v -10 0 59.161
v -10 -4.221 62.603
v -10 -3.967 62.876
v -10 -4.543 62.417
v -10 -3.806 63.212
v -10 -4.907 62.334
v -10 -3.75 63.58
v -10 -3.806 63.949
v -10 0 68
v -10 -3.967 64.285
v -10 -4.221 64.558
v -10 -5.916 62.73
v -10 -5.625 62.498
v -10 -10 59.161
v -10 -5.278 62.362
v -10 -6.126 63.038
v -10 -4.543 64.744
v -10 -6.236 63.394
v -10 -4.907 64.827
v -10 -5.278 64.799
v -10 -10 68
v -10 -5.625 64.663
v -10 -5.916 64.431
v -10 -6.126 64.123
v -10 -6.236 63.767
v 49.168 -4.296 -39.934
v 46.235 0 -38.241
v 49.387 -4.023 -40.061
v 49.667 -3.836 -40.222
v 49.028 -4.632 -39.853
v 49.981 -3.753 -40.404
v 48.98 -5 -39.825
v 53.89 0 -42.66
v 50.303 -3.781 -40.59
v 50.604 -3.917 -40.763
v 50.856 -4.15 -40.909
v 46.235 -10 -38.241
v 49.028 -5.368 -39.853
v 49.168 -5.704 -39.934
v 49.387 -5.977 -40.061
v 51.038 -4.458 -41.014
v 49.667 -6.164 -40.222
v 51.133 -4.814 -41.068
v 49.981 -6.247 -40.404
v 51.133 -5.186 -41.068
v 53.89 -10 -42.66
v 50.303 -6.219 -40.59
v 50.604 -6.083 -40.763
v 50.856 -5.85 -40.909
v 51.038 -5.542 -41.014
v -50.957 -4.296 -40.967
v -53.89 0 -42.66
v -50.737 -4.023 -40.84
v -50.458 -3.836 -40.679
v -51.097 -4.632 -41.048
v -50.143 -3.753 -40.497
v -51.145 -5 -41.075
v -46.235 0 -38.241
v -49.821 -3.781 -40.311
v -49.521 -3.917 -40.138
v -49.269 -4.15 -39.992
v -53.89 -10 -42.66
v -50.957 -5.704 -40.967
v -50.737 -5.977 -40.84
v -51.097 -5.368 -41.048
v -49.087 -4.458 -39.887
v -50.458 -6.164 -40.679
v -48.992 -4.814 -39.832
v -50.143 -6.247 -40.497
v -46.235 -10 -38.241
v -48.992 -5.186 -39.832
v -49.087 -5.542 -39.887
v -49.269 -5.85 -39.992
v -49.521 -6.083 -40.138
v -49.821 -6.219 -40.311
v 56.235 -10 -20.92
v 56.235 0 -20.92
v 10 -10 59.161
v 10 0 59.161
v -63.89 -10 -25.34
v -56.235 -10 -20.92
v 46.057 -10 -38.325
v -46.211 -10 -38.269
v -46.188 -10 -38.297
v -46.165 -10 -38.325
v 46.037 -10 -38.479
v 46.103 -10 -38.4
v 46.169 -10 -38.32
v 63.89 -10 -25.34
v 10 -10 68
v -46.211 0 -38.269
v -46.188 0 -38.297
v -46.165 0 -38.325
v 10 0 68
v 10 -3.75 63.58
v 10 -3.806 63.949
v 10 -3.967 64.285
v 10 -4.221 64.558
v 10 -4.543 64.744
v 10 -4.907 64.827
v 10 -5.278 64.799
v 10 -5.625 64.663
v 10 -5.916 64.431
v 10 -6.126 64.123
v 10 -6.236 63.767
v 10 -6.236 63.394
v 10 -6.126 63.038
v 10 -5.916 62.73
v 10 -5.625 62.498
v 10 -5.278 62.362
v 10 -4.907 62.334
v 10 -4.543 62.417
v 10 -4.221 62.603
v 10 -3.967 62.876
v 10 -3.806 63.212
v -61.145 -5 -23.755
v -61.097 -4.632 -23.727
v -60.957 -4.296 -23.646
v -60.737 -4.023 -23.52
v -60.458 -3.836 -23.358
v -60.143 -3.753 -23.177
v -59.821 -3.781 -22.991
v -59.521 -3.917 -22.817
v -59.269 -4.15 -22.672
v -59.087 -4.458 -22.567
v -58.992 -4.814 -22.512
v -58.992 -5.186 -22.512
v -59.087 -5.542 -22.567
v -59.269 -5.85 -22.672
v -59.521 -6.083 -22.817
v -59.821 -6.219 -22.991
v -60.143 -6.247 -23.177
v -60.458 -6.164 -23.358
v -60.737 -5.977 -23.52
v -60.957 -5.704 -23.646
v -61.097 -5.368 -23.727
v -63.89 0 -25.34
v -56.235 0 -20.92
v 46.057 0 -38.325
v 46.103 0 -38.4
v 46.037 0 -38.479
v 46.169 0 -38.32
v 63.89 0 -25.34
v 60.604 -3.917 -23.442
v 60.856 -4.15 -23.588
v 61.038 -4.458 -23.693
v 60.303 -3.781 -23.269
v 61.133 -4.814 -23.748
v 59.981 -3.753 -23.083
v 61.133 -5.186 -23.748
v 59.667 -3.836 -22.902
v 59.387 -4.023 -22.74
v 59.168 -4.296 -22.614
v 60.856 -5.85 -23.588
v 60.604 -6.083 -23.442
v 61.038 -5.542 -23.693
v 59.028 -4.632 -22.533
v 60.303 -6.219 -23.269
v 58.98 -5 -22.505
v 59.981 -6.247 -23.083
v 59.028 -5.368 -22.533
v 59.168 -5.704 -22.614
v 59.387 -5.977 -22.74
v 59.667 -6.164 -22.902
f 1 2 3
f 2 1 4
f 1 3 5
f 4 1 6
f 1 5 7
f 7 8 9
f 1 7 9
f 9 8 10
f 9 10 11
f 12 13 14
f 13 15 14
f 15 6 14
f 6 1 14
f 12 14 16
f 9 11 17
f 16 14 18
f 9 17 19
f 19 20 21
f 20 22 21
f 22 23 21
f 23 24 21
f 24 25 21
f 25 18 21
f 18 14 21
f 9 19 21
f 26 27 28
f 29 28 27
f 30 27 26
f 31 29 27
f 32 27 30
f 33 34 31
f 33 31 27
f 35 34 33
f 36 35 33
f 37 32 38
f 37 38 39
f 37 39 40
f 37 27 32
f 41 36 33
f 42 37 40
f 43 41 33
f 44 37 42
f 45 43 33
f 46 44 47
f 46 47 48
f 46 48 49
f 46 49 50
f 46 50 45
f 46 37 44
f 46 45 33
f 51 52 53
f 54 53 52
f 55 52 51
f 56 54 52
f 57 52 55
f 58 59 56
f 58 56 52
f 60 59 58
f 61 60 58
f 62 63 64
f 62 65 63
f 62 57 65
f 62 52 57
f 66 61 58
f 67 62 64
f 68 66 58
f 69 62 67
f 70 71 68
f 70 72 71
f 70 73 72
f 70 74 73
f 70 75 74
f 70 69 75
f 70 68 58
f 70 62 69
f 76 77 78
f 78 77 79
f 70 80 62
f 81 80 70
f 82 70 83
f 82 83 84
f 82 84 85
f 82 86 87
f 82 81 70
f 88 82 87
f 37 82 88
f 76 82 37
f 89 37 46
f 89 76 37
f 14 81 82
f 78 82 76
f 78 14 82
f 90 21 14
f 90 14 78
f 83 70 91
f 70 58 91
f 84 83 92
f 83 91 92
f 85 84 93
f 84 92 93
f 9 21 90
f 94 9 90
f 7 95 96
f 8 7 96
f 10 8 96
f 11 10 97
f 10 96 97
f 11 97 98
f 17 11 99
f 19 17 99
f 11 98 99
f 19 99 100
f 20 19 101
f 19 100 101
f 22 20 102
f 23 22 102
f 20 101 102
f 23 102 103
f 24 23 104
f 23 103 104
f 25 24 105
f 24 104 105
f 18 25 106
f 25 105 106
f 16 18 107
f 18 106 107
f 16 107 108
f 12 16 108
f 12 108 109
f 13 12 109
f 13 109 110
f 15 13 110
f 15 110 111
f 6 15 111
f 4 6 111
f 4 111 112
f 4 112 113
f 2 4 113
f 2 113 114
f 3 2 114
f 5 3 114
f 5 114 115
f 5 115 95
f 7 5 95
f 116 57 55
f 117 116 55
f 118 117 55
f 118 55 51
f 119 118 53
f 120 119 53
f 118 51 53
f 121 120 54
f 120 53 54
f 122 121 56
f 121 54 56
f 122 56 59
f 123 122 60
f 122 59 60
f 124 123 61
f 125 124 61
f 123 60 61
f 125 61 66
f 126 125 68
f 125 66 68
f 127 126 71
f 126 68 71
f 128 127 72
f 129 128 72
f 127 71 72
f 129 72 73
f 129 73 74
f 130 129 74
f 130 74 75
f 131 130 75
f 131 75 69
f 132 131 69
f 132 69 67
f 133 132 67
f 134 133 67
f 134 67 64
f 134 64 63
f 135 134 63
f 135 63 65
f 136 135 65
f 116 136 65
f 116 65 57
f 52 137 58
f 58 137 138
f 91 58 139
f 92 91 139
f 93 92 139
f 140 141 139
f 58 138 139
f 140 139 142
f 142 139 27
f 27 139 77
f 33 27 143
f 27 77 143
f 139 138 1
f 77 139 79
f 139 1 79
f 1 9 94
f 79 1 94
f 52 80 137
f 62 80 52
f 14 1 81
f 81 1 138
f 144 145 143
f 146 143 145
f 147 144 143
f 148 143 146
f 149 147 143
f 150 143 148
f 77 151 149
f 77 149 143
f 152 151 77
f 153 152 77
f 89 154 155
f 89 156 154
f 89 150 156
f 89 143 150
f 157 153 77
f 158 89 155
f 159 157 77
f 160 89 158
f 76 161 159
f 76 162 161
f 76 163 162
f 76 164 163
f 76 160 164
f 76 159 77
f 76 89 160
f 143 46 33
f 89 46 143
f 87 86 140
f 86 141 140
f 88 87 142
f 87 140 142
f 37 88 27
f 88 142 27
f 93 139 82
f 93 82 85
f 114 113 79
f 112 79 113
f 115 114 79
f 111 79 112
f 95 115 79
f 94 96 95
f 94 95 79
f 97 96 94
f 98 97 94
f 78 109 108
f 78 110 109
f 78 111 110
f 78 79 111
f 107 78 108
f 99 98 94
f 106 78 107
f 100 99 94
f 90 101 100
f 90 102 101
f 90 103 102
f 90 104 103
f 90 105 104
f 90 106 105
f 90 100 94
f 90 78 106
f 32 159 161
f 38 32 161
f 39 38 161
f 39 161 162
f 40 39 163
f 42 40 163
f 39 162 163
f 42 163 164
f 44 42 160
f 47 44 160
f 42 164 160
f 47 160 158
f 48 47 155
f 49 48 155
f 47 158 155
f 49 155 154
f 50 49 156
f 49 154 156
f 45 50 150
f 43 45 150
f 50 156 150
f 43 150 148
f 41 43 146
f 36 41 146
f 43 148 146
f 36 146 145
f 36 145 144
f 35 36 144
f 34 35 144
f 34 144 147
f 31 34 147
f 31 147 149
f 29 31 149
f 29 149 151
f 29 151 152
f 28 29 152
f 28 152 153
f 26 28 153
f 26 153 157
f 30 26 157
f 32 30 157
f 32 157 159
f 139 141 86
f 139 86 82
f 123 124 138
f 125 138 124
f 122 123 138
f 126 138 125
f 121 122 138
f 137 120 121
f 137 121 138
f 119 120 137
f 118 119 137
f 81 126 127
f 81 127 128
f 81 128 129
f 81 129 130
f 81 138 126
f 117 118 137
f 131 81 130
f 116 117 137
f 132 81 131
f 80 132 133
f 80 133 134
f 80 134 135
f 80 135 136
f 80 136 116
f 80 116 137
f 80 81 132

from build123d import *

# Parameters (mm, degrees)
F0_R      = 60
F1_DEPTH  = 10
F2_W      = 20
F2_H      = 10
F3_DEPTH  = 10
F5_D      = 2.5
F7_D      = 2.5
F9_D      = 2.5
F11_DEPTH = 10.001
F13_DEPTH = 25


with BuildPart() as f1:
    # F0 (on Front) → F1 (new body)
    with BuildSketch(Plane.XZ):
        Circle(F0_R)
    extrude(amount=F1_DEPTH)

    # F2 (on face) → F3 (join)
    with BuildSketch(Plane.XZ.offset(10)):
        with Locations((0, 63)):
            Rectangle(F2_W, F2_H)
        Polygon((-53.8897274573, -42.6602540378), (-45.2294734195, -37.6602540378), (-55.2294734195, -20.3397459622), (-63.8897274573, -25.3397459622), align=None)
        Polygon((63.8897274573, -25.3397459622), (55.2294734195, -20.3397459622), (45.2294734195, -37.6602540378), (53.8897274573, -42.6602540378), align=None)
    extrude(amount=-F3_DEPTH)

    # F5 (through all)
    with Locations(Plane(origin=(-10, 0, 0), x_dir=(0, -1, 0), z_dir=(-1, 0, 0))):
        with Locations((5, 63.5803989155)):
            Hole(F5_D / 2)

    # F7 (through all)
    with Locations(Plane(origin=(-5, 0, 8.6602540378), x_dir=(0.8660254038, 0, 0.5), z_dir=(-0.5, 0, 0.8660254038))):
        with Locations((-63.5803989155, -5)):
            Hole(F7_D / 2)

    # F9 (through all)
    with Locations(Plane(origin=(-5, 0, -8.6602540378), x_dir=(0.8660254038, 0, -0.5), z_dir=(-0.5, 0, -0.8660254038))):
        with Locations((63.5803989155, 5)):
            Hole(F9_D / 2)

    # F10 (on face) → F11 (cut, through all)
    with BuildSketch(Plane.XZ):
        Polygon((46.057395637, -38.3253619075), (-46.2041050196, -38.3253619075), (-47.8550866246, -60.4935437441), (42.8329333663, -62.1057748795), align=None)
    extrude(amount=F11_DEPTH, mode=Mode.SUBTRACT)

    # F12 (on face) → F13 (cut)
    with BuildSketch(Plane(origin=(0, 0, 0), x_dir=(-1, 0, 0), z_dir=(0, 1, 0))):
        Polygon((10, 59.160797831), (56.2347538298, -20.9201448777), (84.3601897359, -9.6184732392), (39.3041819334, 80.4935470223), align=None)
        Polygon((-56.2347538298, -20.9201448777), (-10, 59.160797831), (-43.3372279011, 71.7235354264), (-86.677499705, -3.3440173517), align=None)
    extrude(amount=-F13_DEPTH, mode=Mode.SUBTRACT)


solid = f1.part
